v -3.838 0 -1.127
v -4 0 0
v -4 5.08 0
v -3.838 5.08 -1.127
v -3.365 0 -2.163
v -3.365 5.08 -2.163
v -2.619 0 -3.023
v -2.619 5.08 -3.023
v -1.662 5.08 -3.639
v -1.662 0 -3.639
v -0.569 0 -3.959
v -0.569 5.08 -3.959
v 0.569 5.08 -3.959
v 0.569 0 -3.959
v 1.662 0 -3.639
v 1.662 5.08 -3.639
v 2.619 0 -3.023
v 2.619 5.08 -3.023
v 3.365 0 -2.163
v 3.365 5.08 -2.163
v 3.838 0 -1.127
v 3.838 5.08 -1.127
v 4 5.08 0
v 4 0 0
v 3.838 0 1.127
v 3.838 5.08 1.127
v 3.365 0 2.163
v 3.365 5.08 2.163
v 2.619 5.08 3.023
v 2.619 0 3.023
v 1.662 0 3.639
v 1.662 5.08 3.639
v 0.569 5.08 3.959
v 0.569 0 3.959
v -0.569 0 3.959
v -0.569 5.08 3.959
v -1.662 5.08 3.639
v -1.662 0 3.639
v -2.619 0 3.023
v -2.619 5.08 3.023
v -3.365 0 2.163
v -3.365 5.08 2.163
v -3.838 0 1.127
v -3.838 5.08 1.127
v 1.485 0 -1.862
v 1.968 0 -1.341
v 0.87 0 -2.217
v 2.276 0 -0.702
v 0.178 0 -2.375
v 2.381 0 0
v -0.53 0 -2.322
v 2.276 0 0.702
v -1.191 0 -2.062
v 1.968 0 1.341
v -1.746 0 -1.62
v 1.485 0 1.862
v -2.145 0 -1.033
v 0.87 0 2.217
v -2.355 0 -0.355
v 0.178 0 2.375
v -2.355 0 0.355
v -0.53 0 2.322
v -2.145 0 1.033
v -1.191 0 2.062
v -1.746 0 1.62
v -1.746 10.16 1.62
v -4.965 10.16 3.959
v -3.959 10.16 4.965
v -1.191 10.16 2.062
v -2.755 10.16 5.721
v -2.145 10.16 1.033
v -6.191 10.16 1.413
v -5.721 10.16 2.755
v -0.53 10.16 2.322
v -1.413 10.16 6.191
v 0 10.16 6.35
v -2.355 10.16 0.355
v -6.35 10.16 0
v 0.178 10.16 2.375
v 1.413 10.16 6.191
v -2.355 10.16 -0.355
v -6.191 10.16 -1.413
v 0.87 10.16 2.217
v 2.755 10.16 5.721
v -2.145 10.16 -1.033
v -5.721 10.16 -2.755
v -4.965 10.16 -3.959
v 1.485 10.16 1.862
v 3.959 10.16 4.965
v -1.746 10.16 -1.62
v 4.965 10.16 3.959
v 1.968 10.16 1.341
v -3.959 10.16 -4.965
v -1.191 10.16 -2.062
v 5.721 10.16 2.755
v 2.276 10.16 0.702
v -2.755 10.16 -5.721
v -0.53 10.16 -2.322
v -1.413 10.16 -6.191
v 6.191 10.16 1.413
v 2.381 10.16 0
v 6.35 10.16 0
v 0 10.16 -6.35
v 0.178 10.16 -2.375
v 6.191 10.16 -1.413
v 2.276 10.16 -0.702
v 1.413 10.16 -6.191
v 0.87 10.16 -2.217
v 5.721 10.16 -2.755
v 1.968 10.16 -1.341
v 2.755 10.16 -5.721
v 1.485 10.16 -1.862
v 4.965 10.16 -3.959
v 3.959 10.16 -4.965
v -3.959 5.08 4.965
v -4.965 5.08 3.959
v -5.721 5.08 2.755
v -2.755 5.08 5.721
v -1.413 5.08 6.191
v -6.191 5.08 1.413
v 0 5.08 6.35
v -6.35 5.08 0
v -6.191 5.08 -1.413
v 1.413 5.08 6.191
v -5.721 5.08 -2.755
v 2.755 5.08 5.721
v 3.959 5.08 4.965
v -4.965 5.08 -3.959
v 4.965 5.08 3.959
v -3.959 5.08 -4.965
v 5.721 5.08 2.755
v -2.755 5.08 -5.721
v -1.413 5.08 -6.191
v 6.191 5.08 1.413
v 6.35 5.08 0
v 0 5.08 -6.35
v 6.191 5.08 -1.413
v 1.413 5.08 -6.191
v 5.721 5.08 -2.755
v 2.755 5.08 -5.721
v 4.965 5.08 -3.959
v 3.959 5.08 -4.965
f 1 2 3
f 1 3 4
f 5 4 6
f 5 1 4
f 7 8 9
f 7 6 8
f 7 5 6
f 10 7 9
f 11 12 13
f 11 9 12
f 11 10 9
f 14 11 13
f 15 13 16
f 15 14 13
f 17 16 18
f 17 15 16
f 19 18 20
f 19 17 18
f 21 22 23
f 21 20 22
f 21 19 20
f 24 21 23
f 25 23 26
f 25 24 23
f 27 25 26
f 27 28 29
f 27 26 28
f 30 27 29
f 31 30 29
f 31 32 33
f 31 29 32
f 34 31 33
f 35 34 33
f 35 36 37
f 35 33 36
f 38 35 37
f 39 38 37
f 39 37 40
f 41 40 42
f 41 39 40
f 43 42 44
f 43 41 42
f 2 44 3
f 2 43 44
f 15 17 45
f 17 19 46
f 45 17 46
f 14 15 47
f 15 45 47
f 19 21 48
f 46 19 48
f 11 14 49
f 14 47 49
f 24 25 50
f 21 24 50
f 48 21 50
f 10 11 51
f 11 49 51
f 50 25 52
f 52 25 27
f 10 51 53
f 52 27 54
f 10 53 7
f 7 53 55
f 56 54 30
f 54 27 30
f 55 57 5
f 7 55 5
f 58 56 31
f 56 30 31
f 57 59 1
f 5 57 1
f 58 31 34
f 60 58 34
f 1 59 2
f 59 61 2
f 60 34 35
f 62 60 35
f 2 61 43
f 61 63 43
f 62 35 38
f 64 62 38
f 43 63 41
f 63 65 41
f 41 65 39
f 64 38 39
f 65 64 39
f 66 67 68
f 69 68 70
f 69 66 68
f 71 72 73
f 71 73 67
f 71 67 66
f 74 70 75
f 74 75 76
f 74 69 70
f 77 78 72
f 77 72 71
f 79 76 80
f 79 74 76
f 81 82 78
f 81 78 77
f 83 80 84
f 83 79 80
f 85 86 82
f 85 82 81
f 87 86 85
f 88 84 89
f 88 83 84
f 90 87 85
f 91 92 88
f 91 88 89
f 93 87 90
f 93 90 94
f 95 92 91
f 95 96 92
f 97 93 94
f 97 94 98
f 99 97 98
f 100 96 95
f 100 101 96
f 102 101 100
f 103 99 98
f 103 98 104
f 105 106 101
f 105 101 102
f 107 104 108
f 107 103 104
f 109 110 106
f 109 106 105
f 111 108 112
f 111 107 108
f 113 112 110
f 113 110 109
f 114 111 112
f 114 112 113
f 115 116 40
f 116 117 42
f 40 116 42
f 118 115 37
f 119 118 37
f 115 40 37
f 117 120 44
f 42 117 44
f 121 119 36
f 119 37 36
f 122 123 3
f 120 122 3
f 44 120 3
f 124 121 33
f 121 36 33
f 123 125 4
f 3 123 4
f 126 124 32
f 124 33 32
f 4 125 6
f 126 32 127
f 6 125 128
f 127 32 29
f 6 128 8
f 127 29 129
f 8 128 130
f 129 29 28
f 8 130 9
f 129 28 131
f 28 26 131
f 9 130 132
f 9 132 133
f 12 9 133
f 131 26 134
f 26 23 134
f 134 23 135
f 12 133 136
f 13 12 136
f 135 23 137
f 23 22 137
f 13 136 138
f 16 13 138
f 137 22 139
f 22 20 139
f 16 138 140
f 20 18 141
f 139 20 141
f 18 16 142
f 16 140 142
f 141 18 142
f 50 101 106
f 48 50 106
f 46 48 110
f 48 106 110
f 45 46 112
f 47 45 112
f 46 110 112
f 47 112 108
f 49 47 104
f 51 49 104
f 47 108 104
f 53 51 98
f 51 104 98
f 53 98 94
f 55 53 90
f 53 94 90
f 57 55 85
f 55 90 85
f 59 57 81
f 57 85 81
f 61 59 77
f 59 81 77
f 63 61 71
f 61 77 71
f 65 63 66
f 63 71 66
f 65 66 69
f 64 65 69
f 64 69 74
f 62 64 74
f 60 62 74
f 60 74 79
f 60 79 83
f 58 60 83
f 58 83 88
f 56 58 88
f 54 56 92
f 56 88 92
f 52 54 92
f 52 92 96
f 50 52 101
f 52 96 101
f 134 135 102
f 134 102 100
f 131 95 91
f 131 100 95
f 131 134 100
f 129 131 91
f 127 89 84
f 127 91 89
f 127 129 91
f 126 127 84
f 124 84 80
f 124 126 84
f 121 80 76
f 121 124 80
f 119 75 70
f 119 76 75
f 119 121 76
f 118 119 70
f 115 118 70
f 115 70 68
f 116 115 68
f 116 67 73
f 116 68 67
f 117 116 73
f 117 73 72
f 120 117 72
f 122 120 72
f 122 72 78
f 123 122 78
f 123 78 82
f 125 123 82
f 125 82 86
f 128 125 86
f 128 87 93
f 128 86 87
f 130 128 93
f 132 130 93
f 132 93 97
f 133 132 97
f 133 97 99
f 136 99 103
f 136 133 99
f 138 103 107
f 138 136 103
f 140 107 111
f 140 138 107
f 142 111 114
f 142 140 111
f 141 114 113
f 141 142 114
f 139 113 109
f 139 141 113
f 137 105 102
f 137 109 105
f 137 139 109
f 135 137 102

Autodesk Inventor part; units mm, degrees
ref_plane "YZ Plane" through (0, 0, 0) normal (1, 0, 0) x (0, 1, 0)
ref_plane "XZ Plane" through (0, 0, 0) normal (0, 1, 0) x (-1, 0, 0)
ref_plane "XY Plane" through (0, 0, 0) normal (0, 0, 1) x (1, 0, 0)
sketch "Sketch1" plane through (0, 0, 0) normal (0, 1, 0) x (-1, 0, 0)
  circle A0 centre (0, 0) radius 4
  dimension "d0" = 8
extrude "Extrusion1" add sketch "Sketch1" along normal blind 5.08
sketch "Sketch2" plane through (0, 5.08, 0) normal (0, 1, 0) x (1, 0, 0)
  circle A0 centre (0, 0) radius 6.35
  dimension "d3" = 12.7
extrude "Extrusion2" add sketch "Sketch2" along normal blind 5.08
sketch "Sketch3" plane through (0, 10.16, 0) normal (0, 1, 0) x (1, 0, 0)
  circle A0 centre (0, 0) radius 2.3813 projected
  circle A1 centre (0, 0) radius 2.3813
  point P0 (0, 0)
extrude "Extrusion3" cut sketch "Sketch3" against normal through all
properties part number "Shaft_Adapter"
